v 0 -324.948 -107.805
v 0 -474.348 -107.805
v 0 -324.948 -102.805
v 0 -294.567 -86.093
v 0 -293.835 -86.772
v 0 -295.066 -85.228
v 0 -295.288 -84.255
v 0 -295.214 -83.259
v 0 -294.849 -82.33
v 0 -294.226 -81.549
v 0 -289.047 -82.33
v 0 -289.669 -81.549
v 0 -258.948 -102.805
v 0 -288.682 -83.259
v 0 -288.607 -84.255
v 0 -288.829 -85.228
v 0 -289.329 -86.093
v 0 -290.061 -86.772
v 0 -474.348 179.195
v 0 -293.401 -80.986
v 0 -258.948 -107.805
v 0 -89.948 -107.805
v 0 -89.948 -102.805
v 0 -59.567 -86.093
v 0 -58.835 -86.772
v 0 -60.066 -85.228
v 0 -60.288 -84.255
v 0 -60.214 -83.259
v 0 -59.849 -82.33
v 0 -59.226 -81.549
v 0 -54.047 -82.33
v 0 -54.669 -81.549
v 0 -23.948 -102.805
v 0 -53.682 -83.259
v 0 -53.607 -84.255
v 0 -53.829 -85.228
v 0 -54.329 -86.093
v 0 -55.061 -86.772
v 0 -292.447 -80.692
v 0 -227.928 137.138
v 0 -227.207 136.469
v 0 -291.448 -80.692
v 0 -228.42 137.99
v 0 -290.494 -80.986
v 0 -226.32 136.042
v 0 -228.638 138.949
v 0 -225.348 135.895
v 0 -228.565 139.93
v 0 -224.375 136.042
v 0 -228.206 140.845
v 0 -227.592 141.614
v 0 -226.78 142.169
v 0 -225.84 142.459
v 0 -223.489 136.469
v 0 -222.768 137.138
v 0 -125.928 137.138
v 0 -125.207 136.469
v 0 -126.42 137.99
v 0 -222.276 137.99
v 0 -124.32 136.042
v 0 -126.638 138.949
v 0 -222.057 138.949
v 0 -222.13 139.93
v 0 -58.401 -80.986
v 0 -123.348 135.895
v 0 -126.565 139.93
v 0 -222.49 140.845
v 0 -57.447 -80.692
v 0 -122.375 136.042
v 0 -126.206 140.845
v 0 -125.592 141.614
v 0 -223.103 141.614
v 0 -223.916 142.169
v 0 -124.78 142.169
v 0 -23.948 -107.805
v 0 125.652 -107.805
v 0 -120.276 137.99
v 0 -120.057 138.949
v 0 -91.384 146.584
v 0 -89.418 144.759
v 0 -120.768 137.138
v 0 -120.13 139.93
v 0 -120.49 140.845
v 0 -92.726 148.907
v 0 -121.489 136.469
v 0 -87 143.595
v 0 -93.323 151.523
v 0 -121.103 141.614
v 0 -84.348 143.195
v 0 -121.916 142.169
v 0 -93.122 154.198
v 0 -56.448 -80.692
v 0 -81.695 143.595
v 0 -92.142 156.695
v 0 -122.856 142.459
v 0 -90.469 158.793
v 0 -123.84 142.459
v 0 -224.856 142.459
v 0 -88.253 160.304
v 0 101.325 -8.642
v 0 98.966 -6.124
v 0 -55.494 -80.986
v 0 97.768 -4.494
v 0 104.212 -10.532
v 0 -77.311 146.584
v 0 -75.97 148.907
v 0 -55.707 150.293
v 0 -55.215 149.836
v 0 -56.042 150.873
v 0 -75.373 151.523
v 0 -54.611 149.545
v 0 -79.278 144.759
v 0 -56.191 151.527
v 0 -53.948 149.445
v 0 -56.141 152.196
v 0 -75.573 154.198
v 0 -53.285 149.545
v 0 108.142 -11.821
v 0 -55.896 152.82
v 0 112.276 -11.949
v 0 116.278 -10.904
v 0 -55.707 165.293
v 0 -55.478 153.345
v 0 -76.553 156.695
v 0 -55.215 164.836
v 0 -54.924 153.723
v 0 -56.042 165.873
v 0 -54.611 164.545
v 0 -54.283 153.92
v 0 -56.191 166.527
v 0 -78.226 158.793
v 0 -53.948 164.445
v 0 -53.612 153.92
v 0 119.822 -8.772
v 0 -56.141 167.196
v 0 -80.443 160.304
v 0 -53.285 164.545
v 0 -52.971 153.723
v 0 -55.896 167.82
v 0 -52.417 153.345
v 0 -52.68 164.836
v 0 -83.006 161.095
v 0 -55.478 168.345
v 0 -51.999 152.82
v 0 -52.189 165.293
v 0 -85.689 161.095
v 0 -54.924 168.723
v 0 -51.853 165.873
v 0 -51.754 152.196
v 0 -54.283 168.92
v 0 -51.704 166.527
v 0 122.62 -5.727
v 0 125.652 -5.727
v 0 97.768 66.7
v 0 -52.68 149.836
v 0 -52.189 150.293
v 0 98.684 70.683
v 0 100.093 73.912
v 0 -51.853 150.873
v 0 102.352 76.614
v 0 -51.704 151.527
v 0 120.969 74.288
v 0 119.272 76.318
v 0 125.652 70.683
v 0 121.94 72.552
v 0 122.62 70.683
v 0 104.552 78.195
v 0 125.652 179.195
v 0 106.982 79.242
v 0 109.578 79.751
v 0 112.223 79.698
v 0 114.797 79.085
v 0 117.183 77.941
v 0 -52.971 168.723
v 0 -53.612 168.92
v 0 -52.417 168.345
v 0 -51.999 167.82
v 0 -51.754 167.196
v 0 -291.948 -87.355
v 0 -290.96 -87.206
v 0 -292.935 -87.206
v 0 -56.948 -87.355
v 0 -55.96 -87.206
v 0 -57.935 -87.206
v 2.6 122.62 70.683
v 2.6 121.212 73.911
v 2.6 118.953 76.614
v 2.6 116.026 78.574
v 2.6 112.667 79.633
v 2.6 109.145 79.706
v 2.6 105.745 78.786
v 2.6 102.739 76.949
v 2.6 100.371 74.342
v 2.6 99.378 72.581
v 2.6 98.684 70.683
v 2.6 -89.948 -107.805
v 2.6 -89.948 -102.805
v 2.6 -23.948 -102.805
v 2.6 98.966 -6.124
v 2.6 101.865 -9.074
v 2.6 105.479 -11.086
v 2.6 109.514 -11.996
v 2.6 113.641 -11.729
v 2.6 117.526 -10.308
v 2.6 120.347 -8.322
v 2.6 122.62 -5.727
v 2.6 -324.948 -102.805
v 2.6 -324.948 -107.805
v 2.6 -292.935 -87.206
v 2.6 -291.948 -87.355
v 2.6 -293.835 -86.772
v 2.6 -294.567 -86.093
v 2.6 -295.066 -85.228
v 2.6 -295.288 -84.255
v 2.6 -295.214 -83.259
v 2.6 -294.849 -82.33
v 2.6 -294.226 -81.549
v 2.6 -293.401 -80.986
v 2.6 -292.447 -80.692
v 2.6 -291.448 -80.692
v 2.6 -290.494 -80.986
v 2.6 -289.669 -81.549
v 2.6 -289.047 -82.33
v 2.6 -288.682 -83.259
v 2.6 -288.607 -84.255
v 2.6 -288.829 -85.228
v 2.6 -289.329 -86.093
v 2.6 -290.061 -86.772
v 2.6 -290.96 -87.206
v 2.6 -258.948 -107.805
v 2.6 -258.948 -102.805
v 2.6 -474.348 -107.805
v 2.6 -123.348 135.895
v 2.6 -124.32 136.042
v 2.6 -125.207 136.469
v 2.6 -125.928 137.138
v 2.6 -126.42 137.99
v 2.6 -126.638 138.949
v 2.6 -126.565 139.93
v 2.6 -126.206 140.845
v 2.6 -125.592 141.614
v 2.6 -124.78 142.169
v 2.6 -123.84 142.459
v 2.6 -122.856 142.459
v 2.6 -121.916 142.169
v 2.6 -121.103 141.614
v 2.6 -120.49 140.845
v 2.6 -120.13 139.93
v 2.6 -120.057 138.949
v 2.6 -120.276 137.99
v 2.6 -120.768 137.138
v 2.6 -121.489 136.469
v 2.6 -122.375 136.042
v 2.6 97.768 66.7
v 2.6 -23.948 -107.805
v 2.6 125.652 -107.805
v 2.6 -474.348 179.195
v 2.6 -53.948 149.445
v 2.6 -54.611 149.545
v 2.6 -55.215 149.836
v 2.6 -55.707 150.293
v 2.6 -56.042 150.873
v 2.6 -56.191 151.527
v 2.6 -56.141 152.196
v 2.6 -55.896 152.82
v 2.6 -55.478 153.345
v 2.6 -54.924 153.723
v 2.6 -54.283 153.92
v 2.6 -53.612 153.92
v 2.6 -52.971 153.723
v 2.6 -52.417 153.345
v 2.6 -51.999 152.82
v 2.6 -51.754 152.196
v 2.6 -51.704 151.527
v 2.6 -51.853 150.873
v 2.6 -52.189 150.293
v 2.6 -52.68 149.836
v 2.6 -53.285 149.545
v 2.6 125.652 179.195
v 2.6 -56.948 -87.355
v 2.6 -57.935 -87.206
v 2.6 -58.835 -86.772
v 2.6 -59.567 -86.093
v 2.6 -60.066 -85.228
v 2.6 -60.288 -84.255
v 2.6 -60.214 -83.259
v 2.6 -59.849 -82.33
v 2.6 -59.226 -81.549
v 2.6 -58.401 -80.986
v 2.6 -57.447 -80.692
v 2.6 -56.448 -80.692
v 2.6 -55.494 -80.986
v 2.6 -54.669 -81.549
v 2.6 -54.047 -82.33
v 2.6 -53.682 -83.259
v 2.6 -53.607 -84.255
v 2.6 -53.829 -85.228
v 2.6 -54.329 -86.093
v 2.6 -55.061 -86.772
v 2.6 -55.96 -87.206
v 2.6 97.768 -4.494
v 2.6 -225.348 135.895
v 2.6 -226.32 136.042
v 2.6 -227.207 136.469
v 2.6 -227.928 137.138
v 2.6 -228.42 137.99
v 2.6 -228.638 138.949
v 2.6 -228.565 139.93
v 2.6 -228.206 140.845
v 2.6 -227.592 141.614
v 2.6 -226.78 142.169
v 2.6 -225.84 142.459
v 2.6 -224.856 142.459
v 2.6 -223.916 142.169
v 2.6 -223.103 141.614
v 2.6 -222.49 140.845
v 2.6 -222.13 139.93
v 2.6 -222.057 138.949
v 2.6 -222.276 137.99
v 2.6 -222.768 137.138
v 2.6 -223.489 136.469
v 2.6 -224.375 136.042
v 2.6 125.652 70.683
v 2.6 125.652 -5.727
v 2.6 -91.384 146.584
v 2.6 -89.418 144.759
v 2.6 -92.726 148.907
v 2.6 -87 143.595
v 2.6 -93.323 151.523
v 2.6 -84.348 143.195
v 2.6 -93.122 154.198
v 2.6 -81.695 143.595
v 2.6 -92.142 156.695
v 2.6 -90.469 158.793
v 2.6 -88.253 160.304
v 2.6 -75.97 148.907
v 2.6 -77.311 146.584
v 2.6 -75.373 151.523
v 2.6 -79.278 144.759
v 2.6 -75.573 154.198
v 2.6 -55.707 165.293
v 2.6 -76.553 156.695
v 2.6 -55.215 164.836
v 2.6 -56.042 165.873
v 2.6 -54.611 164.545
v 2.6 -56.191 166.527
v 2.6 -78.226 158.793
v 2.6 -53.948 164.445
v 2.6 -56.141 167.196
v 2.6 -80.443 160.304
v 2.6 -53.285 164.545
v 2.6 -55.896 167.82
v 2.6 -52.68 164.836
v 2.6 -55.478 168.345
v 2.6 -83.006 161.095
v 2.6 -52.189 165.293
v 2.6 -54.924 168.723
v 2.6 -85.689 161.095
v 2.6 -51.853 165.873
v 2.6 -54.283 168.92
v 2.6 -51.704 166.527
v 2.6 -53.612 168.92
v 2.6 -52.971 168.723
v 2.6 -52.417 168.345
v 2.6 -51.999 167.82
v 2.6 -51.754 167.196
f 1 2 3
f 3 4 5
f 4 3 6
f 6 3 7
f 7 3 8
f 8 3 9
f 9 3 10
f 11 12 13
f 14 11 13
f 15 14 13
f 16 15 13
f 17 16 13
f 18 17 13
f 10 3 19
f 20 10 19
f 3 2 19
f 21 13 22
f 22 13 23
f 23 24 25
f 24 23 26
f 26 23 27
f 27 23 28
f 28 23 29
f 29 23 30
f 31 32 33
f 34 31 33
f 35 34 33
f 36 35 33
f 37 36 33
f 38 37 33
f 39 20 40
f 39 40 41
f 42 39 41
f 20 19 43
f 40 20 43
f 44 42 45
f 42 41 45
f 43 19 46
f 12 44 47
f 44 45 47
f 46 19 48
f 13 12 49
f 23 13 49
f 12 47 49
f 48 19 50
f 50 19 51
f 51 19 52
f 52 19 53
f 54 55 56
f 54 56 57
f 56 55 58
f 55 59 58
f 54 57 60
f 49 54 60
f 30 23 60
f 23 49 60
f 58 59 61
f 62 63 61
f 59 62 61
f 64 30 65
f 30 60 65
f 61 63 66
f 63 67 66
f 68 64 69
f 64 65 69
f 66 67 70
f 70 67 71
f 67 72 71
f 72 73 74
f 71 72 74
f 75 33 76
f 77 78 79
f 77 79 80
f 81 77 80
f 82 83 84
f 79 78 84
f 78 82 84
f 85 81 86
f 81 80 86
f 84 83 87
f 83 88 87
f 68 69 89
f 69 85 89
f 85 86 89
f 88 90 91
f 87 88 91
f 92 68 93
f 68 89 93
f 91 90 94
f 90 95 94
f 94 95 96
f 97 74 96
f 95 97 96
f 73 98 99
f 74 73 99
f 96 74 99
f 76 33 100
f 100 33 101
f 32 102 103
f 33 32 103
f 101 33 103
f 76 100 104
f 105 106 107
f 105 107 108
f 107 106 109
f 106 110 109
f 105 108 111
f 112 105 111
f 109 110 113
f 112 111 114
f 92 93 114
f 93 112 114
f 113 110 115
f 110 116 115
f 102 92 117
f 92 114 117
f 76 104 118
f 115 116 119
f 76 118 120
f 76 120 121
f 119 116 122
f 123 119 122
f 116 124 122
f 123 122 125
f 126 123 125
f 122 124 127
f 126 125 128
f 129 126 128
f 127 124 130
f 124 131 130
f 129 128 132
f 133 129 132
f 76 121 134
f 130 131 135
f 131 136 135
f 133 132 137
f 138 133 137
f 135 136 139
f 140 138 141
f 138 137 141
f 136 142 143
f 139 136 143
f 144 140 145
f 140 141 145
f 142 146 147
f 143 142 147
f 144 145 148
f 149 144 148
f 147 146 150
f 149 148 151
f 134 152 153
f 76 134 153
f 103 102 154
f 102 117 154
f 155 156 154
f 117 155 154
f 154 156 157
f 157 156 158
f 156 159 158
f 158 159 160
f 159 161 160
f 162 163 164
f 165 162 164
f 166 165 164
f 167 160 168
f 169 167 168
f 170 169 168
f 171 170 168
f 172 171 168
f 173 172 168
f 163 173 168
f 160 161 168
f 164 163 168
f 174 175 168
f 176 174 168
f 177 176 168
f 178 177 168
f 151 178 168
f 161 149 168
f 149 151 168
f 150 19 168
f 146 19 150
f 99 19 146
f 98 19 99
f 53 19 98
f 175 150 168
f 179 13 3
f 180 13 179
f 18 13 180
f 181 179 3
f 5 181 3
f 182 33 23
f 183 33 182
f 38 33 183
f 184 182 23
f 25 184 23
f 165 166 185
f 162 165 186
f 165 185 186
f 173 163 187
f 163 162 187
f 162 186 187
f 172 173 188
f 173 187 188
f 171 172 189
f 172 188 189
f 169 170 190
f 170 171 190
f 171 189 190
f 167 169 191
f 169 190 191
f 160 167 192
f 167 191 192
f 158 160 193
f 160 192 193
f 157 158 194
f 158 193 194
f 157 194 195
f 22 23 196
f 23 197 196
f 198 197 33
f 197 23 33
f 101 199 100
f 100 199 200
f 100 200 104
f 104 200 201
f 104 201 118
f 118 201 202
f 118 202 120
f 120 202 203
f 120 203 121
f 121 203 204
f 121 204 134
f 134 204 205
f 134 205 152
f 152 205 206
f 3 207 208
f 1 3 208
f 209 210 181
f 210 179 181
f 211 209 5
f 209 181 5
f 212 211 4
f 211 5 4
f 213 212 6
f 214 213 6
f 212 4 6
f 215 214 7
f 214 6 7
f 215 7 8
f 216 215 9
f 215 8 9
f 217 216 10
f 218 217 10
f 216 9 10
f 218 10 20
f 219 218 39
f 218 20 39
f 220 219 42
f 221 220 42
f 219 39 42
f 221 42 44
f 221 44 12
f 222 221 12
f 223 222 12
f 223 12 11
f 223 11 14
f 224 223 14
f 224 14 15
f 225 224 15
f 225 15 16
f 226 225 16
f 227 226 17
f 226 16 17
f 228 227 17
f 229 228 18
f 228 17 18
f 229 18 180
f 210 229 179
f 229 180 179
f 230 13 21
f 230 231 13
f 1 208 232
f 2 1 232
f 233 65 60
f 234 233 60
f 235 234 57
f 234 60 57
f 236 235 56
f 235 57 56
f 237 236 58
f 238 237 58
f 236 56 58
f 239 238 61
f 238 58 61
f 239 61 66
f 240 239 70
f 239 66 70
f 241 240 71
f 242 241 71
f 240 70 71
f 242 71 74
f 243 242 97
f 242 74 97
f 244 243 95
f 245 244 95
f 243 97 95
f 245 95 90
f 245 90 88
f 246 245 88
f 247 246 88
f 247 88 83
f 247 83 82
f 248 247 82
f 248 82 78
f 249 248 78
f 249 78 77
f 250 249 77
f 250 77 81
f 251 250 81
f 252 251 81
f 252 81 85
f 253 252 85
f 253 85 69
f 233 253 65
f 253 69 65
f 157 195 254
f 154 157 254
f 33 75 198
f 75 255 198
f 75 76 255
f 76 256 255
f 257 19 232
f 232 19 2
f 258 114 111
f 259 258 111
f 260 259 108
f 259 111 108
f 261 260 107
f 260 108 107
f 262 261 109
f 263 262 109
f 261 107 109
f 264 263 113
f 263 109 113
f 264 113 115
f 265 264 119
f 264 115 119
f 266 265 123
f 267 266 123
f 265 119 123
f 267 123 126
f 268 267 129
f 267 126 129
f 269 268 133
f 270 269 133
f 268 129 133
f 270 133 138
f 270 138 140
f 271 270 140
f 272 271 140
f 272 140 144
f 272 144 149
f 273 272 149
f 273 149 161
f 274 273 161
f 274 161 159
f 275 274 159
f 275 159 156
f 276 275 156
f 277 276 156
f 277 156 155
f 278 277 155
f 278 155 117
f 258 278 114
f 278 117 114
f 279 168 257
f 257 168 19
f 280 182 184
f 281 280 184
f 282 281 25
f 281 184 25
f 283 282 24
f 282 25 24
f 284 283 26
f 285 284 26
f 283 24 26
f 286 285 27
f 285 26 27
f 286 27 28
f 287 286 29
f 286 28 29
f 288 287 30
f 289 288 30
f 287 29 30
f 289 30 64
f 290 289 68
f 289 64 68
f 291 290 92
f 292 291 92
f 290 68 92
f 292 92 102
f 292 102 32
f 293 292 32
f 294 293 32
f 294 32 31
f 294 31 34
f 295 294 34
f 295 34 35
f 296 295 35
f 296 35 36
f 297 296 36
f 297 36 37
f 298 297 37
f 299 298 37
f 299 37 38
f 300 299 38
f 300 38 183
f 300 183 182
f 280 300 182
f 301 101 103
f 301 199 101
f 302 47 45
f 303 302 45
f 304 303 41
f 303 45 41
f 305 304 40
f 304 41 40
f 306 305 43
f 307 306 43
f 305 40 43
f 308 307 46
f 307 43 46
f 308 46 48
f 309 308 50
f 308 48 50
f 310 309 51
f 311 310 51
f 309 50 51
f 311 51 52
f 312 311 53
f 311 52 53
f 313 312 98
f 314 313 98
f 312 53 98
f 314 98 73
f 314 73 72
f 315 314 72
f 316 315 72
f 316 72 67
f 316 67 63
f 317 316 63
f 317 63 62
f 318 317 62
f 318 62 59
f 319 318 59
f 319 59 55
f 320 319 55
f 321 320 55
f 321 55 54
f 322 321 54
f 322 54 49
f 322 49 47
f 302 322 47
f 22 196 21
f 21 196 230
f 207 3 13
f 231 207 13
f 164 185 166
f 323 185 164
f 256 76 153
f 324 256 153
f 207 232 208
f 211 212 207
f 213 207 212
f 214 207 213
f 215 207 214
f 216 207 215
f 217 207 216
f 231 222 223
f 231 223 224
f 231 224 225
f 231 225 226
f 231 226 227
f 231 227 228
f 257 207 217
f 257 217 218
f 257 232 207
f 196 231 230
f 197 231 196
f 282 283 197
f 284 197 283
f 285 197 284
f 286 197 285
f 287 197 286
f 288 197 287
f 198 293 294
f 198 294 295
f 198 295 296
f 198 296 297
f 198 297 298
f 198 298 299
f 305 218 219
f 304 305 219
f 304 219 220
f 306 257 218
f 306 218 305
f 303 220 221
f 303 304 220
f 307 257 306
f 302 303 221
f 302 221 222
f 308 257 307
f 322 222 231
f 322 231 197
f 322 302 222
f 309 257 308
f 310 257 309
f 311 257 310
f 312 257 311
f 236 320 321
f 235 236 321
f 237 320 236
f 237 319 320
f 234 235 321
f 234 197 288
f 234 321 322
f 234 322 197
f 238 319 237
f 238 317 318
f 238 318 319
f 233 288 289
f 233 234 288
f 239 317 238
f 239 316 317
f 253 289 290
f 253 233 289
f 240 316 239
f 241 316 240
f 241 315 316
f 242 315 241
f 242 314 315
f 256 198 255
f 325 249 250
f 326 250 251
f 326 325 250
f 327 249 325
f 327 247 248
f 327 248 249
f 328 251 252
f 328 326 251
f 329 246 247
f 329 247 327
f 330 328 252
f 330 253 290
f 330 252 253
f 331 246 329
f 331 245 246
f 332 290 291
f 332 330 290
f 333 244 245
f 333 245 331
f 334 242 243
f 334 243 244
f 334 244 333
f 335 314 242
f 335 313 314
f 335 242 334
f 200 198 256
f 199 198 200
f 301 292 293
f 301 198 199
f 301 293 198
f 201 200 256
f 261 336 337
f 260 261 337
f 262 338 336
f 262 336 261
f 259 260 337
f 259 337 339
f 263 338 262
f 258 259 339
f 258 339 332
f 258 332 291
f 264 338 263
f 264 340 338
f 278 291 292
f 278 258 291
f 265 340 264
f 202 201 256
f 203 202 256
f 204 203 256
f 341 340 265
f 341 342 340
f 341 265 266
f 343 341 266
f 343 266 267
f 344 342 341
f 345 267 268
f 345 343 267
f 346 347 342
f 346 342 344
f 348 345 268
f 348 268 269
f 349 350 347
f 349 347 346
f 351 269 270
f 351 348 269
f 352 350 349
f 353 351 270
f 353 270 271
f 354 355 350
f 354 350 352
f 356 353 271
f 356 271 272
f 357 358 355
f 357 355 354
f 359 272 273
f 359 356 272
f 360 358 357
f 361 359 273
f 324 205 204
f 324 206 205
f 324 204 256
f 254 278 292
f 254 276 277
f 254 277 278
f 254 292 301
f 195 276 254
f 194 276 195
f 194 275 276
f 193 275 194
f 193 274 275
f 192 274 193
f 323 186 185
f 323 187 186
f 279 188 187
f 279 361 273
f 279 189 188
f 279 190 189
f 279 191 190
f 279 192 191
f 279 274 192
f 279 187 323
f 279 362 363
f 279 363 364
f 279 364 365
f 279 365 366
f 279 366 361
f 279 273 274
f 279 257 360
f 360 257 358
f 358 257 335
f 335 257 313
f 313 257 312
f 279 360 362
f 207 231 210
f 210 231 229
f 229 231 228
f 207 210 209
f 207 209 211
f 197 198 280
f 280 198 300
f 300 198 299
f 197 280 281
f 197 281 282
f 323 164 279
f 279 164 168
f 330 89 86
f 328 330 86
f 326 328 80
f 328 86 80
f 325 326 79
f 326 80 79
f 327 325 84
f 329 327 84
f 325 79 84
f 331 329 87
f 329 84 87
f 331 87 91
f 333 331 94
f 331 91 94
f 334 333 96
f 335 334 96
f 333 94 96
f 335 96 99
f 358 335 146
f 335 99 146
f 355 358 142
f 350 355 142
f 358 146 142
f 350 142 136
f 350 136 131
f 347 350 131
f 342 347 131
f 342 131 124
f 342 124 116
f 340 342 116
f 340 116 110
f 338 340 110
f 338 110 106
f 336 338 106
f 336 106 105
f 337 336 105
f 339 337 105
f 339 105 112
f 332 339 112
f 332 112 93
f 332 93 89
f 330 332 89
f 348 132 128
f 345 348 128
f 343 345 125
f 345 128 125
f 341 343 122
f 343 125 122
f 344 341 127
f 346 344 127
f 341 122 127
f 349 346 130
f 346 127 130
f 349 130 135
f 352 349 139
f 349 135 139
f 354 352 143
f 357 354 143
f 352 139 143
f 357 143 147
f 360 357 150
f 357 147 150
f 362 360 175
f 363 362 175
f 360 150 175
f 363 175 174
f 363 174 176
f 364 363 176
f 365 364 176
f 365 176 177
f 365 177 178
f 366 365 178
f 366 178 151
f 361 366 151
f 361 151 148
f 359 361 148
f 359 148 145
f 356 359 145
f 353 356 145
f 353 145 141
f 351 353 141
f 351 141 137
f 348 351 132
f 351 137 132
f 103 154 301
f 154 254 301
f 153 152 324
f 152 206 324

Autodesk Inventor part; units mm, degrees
ref_plane "YZ Plane" through (0, 0, 0) normal (1, 0, 0) x (0, 1, 0)
ref_plane "XZ Plane" through (0, 0, 0) normal (0, 1, 0) x (-1, 0, 0)
ref_plane "XY Plane" through (0, 0, 0) normal (0, 0, 1) x (1, 0, 0)
sketch "スケッチ1" plane through (0, 0, 0) normal (1, 0, 0) x (0, 1, 0)
  line L0 (125.6523, 179.1954) -> (-474.3477, 179.1954)
  line L1 (-474.3477, 179.1954) -> (-474.3477, -102.8046)
  line L2 (-474.3477, -102.8046) -> (125.6523, -102.8046)
  line L3 (125.6523, -102.8046) -> (125.6523, 179.1954)
  dimension "d0" = 600
  dimension "d1" = 282
extrude "押し出し1" add sketch "スケッチ1" along normal blind 2.6
sketch "スケッチ4" plane through (2.6, 0, 0) normal (1, 0, 0) x (0, 0, -1)
  line L0 (102.8046, 125.6523) -> (-179.1954, 125.6523) projected
  line L1 (-179.1954, 125.6523) -> (-179.1954, -474.3477) projected
  point P0 (0, 0)
  point P1 (-139.1954, -225.3477)
  point P2 (-139.1954, -123.3477)
  dimension "d19" = 102
  dimension "d20" = 249
  dimension "d21" = 40
  dimension "d22" = 40
hole "穴2" at (2.6, -225.3477, 139.1954) at (2.6, -123.3477, 139.1954) direction (-1, 0, 0) diameter 6.6 end through all
sketch "スケッチ5" plane through (2.6, 0, 0) normal (1, 0, 0) x (0, 0, -1)
  line L0 (-179.1954, 125.6523) -> (-179.1954, -474.3477) projected
  line L1 (102.8046, 125.6523) -> (-179.1954, 125.6523) projected
  point P0 (-152.1954, -84.3477)
  dimension "d30" = 27
  dimension "d31" = 210
hole "穴3" at (2.6, -84.3477, 152.1954) direction (-1, 0, 0) diameter 18 end through all
sketch "スケッチ6" plane through (2.6, 0, 0) normal (1, 0, 0) x (0, 0, -1)
  line L0 (-179.1954, 125.6523) -> (-179.1954, -474.3477) projected
  circle A0 centre (-152.1954, -84.3477) radius 9 projected
  point P0 (0, 0)
  point P1 (-166.6954, -53.9477)
  point P2 (-151.6954, -53.9477)
  dimension "d39" = 12.5
  dimension "d40" = 27.5
  dimension "d41" = 30.4
  dimension "d42" = 30.4
hole "穴4" at (2.6, -53.9477, 166.6954) at (2.6, -53.9477, 151.6954) direction (-1, 0, 0) diameter 4.5 end through all
sketch "スケッチ7" plane through (2.6, 0, 0) normal (1, 0, 0) x (0, 0, -1)
  line L0 (102.8046, 125.6523) -> (-179.1954, 125.6523) projected
  line L1 (102.8046, -474.3477) -> (102.8046, 125.6523) projected
  line L2 (-179.1954, -474.3477) -> (102.8046, -474.3477) projected
  point P0 (0, 0)
  point P1 (84.0046, -56.9477)
  point P2 (84.0046, -291.9477)
  dimension "d50" = 182.6
  dimension "d51" = 18.8
  dimension "d52" = 18.8
  dimension "d53" = 182.4
hole "穴5" at (2.6, -56.9477, -84.0046) at (2.6, -291.9477, -84.0046) direction (-1, 0, 0) diameter 6.7 end through all
sketch "スケッチ8" plane through (2.6, 0, 0) normal (1, 0, 0) x (0, 0, -1)
  line L0 (102.8046, -474.3477) -> (102.8046, 125.6523) projected
  line L1 (102.8046, 125.6523) -> (107.8046, 125.6523)
  line L2 (117.7603, -23.9477) -> (102.8046, -23.9477)
  line L3 (102.8046, -89.9477) -> (117.7603, -89.9477)
  line L4 (107.8046, 125.6523) -> (107.8046, -474.3477)
  line L5 (107.8046, -474.3477) -> (102.8046, -474.3477)
  line L6 (102.8046, -258.9477) -> (107.8046, -258.9477)
  line L7 (102.8046, -324.9477) -> (107.8046, -324.9477)
  circle A0 centre (84.0046, -56.9477) radius 3.35 projected
  circle A1 centre (84.0046, -291.9477) radius 3.35 projected
  point P0 (0, 0)
  point P1 (107.8046, -23.9477)
  point P2 (107.8046, -89.9477)
  dimension "d61" = 5
  dimension "d62" = 33
  dimension "d63" = 33
  dimension "d64" = 33
  dimension "d65" = 33
extrude "押し出し3" add sketch "スケッチ8" against normal blind 2.6 contours L0 L7 L4 L5 | L0 L3 L4 L6 | L0 L1 L4 L2
sketch "スケッチ9" plane through (2.6, 0, 0) normal (1, 0, 0) x (0, 0, -1)
  ellipse E0 centre (-2.4593, 110.6523) end of major axis (-2.4593, 125.1521) minor radius 14.4996 (5.606, 98.6026) -> (5.606, 122.702) ccw
  line L0 (4.4935, 123.5363) -> (-99.9579, 123.5363) projected
  line L1 (-99.9579, 97.7683) -> (4.4935, 97.7683) projected
  ellipse E1 centre (-67.383, 110.6523) end of major axis (-67.383, 123.067) minor radius 12.4145 (-70.683, 122.6204) -> (-70.683, 98.6842) ccw projected
  line L2 (-70.683, 122.6204) -> (-70.683, 125.6523)
  line L3 (102.8046, 125.6523) -> (-179.1954, 125.6523) projected
  line L4 (5.7266, 122.6204) -> (5.7266, 125.6523)
  line L5 (5.7266, 125.6523) -> (-70.683, 125.6523)
  line L6 (6.1243, 98.9661) -> (4.4935, 97.7683)
  line L7 (-70.683, 98.6842) -> (-66.6998, 97.7683)
  point P0 (0, 0)
extrude "押し出し4" cut sketch "スケッチ9" against normal blind 3
properties part number "lc_box_side" material "ポリカーボネート、クリア"
